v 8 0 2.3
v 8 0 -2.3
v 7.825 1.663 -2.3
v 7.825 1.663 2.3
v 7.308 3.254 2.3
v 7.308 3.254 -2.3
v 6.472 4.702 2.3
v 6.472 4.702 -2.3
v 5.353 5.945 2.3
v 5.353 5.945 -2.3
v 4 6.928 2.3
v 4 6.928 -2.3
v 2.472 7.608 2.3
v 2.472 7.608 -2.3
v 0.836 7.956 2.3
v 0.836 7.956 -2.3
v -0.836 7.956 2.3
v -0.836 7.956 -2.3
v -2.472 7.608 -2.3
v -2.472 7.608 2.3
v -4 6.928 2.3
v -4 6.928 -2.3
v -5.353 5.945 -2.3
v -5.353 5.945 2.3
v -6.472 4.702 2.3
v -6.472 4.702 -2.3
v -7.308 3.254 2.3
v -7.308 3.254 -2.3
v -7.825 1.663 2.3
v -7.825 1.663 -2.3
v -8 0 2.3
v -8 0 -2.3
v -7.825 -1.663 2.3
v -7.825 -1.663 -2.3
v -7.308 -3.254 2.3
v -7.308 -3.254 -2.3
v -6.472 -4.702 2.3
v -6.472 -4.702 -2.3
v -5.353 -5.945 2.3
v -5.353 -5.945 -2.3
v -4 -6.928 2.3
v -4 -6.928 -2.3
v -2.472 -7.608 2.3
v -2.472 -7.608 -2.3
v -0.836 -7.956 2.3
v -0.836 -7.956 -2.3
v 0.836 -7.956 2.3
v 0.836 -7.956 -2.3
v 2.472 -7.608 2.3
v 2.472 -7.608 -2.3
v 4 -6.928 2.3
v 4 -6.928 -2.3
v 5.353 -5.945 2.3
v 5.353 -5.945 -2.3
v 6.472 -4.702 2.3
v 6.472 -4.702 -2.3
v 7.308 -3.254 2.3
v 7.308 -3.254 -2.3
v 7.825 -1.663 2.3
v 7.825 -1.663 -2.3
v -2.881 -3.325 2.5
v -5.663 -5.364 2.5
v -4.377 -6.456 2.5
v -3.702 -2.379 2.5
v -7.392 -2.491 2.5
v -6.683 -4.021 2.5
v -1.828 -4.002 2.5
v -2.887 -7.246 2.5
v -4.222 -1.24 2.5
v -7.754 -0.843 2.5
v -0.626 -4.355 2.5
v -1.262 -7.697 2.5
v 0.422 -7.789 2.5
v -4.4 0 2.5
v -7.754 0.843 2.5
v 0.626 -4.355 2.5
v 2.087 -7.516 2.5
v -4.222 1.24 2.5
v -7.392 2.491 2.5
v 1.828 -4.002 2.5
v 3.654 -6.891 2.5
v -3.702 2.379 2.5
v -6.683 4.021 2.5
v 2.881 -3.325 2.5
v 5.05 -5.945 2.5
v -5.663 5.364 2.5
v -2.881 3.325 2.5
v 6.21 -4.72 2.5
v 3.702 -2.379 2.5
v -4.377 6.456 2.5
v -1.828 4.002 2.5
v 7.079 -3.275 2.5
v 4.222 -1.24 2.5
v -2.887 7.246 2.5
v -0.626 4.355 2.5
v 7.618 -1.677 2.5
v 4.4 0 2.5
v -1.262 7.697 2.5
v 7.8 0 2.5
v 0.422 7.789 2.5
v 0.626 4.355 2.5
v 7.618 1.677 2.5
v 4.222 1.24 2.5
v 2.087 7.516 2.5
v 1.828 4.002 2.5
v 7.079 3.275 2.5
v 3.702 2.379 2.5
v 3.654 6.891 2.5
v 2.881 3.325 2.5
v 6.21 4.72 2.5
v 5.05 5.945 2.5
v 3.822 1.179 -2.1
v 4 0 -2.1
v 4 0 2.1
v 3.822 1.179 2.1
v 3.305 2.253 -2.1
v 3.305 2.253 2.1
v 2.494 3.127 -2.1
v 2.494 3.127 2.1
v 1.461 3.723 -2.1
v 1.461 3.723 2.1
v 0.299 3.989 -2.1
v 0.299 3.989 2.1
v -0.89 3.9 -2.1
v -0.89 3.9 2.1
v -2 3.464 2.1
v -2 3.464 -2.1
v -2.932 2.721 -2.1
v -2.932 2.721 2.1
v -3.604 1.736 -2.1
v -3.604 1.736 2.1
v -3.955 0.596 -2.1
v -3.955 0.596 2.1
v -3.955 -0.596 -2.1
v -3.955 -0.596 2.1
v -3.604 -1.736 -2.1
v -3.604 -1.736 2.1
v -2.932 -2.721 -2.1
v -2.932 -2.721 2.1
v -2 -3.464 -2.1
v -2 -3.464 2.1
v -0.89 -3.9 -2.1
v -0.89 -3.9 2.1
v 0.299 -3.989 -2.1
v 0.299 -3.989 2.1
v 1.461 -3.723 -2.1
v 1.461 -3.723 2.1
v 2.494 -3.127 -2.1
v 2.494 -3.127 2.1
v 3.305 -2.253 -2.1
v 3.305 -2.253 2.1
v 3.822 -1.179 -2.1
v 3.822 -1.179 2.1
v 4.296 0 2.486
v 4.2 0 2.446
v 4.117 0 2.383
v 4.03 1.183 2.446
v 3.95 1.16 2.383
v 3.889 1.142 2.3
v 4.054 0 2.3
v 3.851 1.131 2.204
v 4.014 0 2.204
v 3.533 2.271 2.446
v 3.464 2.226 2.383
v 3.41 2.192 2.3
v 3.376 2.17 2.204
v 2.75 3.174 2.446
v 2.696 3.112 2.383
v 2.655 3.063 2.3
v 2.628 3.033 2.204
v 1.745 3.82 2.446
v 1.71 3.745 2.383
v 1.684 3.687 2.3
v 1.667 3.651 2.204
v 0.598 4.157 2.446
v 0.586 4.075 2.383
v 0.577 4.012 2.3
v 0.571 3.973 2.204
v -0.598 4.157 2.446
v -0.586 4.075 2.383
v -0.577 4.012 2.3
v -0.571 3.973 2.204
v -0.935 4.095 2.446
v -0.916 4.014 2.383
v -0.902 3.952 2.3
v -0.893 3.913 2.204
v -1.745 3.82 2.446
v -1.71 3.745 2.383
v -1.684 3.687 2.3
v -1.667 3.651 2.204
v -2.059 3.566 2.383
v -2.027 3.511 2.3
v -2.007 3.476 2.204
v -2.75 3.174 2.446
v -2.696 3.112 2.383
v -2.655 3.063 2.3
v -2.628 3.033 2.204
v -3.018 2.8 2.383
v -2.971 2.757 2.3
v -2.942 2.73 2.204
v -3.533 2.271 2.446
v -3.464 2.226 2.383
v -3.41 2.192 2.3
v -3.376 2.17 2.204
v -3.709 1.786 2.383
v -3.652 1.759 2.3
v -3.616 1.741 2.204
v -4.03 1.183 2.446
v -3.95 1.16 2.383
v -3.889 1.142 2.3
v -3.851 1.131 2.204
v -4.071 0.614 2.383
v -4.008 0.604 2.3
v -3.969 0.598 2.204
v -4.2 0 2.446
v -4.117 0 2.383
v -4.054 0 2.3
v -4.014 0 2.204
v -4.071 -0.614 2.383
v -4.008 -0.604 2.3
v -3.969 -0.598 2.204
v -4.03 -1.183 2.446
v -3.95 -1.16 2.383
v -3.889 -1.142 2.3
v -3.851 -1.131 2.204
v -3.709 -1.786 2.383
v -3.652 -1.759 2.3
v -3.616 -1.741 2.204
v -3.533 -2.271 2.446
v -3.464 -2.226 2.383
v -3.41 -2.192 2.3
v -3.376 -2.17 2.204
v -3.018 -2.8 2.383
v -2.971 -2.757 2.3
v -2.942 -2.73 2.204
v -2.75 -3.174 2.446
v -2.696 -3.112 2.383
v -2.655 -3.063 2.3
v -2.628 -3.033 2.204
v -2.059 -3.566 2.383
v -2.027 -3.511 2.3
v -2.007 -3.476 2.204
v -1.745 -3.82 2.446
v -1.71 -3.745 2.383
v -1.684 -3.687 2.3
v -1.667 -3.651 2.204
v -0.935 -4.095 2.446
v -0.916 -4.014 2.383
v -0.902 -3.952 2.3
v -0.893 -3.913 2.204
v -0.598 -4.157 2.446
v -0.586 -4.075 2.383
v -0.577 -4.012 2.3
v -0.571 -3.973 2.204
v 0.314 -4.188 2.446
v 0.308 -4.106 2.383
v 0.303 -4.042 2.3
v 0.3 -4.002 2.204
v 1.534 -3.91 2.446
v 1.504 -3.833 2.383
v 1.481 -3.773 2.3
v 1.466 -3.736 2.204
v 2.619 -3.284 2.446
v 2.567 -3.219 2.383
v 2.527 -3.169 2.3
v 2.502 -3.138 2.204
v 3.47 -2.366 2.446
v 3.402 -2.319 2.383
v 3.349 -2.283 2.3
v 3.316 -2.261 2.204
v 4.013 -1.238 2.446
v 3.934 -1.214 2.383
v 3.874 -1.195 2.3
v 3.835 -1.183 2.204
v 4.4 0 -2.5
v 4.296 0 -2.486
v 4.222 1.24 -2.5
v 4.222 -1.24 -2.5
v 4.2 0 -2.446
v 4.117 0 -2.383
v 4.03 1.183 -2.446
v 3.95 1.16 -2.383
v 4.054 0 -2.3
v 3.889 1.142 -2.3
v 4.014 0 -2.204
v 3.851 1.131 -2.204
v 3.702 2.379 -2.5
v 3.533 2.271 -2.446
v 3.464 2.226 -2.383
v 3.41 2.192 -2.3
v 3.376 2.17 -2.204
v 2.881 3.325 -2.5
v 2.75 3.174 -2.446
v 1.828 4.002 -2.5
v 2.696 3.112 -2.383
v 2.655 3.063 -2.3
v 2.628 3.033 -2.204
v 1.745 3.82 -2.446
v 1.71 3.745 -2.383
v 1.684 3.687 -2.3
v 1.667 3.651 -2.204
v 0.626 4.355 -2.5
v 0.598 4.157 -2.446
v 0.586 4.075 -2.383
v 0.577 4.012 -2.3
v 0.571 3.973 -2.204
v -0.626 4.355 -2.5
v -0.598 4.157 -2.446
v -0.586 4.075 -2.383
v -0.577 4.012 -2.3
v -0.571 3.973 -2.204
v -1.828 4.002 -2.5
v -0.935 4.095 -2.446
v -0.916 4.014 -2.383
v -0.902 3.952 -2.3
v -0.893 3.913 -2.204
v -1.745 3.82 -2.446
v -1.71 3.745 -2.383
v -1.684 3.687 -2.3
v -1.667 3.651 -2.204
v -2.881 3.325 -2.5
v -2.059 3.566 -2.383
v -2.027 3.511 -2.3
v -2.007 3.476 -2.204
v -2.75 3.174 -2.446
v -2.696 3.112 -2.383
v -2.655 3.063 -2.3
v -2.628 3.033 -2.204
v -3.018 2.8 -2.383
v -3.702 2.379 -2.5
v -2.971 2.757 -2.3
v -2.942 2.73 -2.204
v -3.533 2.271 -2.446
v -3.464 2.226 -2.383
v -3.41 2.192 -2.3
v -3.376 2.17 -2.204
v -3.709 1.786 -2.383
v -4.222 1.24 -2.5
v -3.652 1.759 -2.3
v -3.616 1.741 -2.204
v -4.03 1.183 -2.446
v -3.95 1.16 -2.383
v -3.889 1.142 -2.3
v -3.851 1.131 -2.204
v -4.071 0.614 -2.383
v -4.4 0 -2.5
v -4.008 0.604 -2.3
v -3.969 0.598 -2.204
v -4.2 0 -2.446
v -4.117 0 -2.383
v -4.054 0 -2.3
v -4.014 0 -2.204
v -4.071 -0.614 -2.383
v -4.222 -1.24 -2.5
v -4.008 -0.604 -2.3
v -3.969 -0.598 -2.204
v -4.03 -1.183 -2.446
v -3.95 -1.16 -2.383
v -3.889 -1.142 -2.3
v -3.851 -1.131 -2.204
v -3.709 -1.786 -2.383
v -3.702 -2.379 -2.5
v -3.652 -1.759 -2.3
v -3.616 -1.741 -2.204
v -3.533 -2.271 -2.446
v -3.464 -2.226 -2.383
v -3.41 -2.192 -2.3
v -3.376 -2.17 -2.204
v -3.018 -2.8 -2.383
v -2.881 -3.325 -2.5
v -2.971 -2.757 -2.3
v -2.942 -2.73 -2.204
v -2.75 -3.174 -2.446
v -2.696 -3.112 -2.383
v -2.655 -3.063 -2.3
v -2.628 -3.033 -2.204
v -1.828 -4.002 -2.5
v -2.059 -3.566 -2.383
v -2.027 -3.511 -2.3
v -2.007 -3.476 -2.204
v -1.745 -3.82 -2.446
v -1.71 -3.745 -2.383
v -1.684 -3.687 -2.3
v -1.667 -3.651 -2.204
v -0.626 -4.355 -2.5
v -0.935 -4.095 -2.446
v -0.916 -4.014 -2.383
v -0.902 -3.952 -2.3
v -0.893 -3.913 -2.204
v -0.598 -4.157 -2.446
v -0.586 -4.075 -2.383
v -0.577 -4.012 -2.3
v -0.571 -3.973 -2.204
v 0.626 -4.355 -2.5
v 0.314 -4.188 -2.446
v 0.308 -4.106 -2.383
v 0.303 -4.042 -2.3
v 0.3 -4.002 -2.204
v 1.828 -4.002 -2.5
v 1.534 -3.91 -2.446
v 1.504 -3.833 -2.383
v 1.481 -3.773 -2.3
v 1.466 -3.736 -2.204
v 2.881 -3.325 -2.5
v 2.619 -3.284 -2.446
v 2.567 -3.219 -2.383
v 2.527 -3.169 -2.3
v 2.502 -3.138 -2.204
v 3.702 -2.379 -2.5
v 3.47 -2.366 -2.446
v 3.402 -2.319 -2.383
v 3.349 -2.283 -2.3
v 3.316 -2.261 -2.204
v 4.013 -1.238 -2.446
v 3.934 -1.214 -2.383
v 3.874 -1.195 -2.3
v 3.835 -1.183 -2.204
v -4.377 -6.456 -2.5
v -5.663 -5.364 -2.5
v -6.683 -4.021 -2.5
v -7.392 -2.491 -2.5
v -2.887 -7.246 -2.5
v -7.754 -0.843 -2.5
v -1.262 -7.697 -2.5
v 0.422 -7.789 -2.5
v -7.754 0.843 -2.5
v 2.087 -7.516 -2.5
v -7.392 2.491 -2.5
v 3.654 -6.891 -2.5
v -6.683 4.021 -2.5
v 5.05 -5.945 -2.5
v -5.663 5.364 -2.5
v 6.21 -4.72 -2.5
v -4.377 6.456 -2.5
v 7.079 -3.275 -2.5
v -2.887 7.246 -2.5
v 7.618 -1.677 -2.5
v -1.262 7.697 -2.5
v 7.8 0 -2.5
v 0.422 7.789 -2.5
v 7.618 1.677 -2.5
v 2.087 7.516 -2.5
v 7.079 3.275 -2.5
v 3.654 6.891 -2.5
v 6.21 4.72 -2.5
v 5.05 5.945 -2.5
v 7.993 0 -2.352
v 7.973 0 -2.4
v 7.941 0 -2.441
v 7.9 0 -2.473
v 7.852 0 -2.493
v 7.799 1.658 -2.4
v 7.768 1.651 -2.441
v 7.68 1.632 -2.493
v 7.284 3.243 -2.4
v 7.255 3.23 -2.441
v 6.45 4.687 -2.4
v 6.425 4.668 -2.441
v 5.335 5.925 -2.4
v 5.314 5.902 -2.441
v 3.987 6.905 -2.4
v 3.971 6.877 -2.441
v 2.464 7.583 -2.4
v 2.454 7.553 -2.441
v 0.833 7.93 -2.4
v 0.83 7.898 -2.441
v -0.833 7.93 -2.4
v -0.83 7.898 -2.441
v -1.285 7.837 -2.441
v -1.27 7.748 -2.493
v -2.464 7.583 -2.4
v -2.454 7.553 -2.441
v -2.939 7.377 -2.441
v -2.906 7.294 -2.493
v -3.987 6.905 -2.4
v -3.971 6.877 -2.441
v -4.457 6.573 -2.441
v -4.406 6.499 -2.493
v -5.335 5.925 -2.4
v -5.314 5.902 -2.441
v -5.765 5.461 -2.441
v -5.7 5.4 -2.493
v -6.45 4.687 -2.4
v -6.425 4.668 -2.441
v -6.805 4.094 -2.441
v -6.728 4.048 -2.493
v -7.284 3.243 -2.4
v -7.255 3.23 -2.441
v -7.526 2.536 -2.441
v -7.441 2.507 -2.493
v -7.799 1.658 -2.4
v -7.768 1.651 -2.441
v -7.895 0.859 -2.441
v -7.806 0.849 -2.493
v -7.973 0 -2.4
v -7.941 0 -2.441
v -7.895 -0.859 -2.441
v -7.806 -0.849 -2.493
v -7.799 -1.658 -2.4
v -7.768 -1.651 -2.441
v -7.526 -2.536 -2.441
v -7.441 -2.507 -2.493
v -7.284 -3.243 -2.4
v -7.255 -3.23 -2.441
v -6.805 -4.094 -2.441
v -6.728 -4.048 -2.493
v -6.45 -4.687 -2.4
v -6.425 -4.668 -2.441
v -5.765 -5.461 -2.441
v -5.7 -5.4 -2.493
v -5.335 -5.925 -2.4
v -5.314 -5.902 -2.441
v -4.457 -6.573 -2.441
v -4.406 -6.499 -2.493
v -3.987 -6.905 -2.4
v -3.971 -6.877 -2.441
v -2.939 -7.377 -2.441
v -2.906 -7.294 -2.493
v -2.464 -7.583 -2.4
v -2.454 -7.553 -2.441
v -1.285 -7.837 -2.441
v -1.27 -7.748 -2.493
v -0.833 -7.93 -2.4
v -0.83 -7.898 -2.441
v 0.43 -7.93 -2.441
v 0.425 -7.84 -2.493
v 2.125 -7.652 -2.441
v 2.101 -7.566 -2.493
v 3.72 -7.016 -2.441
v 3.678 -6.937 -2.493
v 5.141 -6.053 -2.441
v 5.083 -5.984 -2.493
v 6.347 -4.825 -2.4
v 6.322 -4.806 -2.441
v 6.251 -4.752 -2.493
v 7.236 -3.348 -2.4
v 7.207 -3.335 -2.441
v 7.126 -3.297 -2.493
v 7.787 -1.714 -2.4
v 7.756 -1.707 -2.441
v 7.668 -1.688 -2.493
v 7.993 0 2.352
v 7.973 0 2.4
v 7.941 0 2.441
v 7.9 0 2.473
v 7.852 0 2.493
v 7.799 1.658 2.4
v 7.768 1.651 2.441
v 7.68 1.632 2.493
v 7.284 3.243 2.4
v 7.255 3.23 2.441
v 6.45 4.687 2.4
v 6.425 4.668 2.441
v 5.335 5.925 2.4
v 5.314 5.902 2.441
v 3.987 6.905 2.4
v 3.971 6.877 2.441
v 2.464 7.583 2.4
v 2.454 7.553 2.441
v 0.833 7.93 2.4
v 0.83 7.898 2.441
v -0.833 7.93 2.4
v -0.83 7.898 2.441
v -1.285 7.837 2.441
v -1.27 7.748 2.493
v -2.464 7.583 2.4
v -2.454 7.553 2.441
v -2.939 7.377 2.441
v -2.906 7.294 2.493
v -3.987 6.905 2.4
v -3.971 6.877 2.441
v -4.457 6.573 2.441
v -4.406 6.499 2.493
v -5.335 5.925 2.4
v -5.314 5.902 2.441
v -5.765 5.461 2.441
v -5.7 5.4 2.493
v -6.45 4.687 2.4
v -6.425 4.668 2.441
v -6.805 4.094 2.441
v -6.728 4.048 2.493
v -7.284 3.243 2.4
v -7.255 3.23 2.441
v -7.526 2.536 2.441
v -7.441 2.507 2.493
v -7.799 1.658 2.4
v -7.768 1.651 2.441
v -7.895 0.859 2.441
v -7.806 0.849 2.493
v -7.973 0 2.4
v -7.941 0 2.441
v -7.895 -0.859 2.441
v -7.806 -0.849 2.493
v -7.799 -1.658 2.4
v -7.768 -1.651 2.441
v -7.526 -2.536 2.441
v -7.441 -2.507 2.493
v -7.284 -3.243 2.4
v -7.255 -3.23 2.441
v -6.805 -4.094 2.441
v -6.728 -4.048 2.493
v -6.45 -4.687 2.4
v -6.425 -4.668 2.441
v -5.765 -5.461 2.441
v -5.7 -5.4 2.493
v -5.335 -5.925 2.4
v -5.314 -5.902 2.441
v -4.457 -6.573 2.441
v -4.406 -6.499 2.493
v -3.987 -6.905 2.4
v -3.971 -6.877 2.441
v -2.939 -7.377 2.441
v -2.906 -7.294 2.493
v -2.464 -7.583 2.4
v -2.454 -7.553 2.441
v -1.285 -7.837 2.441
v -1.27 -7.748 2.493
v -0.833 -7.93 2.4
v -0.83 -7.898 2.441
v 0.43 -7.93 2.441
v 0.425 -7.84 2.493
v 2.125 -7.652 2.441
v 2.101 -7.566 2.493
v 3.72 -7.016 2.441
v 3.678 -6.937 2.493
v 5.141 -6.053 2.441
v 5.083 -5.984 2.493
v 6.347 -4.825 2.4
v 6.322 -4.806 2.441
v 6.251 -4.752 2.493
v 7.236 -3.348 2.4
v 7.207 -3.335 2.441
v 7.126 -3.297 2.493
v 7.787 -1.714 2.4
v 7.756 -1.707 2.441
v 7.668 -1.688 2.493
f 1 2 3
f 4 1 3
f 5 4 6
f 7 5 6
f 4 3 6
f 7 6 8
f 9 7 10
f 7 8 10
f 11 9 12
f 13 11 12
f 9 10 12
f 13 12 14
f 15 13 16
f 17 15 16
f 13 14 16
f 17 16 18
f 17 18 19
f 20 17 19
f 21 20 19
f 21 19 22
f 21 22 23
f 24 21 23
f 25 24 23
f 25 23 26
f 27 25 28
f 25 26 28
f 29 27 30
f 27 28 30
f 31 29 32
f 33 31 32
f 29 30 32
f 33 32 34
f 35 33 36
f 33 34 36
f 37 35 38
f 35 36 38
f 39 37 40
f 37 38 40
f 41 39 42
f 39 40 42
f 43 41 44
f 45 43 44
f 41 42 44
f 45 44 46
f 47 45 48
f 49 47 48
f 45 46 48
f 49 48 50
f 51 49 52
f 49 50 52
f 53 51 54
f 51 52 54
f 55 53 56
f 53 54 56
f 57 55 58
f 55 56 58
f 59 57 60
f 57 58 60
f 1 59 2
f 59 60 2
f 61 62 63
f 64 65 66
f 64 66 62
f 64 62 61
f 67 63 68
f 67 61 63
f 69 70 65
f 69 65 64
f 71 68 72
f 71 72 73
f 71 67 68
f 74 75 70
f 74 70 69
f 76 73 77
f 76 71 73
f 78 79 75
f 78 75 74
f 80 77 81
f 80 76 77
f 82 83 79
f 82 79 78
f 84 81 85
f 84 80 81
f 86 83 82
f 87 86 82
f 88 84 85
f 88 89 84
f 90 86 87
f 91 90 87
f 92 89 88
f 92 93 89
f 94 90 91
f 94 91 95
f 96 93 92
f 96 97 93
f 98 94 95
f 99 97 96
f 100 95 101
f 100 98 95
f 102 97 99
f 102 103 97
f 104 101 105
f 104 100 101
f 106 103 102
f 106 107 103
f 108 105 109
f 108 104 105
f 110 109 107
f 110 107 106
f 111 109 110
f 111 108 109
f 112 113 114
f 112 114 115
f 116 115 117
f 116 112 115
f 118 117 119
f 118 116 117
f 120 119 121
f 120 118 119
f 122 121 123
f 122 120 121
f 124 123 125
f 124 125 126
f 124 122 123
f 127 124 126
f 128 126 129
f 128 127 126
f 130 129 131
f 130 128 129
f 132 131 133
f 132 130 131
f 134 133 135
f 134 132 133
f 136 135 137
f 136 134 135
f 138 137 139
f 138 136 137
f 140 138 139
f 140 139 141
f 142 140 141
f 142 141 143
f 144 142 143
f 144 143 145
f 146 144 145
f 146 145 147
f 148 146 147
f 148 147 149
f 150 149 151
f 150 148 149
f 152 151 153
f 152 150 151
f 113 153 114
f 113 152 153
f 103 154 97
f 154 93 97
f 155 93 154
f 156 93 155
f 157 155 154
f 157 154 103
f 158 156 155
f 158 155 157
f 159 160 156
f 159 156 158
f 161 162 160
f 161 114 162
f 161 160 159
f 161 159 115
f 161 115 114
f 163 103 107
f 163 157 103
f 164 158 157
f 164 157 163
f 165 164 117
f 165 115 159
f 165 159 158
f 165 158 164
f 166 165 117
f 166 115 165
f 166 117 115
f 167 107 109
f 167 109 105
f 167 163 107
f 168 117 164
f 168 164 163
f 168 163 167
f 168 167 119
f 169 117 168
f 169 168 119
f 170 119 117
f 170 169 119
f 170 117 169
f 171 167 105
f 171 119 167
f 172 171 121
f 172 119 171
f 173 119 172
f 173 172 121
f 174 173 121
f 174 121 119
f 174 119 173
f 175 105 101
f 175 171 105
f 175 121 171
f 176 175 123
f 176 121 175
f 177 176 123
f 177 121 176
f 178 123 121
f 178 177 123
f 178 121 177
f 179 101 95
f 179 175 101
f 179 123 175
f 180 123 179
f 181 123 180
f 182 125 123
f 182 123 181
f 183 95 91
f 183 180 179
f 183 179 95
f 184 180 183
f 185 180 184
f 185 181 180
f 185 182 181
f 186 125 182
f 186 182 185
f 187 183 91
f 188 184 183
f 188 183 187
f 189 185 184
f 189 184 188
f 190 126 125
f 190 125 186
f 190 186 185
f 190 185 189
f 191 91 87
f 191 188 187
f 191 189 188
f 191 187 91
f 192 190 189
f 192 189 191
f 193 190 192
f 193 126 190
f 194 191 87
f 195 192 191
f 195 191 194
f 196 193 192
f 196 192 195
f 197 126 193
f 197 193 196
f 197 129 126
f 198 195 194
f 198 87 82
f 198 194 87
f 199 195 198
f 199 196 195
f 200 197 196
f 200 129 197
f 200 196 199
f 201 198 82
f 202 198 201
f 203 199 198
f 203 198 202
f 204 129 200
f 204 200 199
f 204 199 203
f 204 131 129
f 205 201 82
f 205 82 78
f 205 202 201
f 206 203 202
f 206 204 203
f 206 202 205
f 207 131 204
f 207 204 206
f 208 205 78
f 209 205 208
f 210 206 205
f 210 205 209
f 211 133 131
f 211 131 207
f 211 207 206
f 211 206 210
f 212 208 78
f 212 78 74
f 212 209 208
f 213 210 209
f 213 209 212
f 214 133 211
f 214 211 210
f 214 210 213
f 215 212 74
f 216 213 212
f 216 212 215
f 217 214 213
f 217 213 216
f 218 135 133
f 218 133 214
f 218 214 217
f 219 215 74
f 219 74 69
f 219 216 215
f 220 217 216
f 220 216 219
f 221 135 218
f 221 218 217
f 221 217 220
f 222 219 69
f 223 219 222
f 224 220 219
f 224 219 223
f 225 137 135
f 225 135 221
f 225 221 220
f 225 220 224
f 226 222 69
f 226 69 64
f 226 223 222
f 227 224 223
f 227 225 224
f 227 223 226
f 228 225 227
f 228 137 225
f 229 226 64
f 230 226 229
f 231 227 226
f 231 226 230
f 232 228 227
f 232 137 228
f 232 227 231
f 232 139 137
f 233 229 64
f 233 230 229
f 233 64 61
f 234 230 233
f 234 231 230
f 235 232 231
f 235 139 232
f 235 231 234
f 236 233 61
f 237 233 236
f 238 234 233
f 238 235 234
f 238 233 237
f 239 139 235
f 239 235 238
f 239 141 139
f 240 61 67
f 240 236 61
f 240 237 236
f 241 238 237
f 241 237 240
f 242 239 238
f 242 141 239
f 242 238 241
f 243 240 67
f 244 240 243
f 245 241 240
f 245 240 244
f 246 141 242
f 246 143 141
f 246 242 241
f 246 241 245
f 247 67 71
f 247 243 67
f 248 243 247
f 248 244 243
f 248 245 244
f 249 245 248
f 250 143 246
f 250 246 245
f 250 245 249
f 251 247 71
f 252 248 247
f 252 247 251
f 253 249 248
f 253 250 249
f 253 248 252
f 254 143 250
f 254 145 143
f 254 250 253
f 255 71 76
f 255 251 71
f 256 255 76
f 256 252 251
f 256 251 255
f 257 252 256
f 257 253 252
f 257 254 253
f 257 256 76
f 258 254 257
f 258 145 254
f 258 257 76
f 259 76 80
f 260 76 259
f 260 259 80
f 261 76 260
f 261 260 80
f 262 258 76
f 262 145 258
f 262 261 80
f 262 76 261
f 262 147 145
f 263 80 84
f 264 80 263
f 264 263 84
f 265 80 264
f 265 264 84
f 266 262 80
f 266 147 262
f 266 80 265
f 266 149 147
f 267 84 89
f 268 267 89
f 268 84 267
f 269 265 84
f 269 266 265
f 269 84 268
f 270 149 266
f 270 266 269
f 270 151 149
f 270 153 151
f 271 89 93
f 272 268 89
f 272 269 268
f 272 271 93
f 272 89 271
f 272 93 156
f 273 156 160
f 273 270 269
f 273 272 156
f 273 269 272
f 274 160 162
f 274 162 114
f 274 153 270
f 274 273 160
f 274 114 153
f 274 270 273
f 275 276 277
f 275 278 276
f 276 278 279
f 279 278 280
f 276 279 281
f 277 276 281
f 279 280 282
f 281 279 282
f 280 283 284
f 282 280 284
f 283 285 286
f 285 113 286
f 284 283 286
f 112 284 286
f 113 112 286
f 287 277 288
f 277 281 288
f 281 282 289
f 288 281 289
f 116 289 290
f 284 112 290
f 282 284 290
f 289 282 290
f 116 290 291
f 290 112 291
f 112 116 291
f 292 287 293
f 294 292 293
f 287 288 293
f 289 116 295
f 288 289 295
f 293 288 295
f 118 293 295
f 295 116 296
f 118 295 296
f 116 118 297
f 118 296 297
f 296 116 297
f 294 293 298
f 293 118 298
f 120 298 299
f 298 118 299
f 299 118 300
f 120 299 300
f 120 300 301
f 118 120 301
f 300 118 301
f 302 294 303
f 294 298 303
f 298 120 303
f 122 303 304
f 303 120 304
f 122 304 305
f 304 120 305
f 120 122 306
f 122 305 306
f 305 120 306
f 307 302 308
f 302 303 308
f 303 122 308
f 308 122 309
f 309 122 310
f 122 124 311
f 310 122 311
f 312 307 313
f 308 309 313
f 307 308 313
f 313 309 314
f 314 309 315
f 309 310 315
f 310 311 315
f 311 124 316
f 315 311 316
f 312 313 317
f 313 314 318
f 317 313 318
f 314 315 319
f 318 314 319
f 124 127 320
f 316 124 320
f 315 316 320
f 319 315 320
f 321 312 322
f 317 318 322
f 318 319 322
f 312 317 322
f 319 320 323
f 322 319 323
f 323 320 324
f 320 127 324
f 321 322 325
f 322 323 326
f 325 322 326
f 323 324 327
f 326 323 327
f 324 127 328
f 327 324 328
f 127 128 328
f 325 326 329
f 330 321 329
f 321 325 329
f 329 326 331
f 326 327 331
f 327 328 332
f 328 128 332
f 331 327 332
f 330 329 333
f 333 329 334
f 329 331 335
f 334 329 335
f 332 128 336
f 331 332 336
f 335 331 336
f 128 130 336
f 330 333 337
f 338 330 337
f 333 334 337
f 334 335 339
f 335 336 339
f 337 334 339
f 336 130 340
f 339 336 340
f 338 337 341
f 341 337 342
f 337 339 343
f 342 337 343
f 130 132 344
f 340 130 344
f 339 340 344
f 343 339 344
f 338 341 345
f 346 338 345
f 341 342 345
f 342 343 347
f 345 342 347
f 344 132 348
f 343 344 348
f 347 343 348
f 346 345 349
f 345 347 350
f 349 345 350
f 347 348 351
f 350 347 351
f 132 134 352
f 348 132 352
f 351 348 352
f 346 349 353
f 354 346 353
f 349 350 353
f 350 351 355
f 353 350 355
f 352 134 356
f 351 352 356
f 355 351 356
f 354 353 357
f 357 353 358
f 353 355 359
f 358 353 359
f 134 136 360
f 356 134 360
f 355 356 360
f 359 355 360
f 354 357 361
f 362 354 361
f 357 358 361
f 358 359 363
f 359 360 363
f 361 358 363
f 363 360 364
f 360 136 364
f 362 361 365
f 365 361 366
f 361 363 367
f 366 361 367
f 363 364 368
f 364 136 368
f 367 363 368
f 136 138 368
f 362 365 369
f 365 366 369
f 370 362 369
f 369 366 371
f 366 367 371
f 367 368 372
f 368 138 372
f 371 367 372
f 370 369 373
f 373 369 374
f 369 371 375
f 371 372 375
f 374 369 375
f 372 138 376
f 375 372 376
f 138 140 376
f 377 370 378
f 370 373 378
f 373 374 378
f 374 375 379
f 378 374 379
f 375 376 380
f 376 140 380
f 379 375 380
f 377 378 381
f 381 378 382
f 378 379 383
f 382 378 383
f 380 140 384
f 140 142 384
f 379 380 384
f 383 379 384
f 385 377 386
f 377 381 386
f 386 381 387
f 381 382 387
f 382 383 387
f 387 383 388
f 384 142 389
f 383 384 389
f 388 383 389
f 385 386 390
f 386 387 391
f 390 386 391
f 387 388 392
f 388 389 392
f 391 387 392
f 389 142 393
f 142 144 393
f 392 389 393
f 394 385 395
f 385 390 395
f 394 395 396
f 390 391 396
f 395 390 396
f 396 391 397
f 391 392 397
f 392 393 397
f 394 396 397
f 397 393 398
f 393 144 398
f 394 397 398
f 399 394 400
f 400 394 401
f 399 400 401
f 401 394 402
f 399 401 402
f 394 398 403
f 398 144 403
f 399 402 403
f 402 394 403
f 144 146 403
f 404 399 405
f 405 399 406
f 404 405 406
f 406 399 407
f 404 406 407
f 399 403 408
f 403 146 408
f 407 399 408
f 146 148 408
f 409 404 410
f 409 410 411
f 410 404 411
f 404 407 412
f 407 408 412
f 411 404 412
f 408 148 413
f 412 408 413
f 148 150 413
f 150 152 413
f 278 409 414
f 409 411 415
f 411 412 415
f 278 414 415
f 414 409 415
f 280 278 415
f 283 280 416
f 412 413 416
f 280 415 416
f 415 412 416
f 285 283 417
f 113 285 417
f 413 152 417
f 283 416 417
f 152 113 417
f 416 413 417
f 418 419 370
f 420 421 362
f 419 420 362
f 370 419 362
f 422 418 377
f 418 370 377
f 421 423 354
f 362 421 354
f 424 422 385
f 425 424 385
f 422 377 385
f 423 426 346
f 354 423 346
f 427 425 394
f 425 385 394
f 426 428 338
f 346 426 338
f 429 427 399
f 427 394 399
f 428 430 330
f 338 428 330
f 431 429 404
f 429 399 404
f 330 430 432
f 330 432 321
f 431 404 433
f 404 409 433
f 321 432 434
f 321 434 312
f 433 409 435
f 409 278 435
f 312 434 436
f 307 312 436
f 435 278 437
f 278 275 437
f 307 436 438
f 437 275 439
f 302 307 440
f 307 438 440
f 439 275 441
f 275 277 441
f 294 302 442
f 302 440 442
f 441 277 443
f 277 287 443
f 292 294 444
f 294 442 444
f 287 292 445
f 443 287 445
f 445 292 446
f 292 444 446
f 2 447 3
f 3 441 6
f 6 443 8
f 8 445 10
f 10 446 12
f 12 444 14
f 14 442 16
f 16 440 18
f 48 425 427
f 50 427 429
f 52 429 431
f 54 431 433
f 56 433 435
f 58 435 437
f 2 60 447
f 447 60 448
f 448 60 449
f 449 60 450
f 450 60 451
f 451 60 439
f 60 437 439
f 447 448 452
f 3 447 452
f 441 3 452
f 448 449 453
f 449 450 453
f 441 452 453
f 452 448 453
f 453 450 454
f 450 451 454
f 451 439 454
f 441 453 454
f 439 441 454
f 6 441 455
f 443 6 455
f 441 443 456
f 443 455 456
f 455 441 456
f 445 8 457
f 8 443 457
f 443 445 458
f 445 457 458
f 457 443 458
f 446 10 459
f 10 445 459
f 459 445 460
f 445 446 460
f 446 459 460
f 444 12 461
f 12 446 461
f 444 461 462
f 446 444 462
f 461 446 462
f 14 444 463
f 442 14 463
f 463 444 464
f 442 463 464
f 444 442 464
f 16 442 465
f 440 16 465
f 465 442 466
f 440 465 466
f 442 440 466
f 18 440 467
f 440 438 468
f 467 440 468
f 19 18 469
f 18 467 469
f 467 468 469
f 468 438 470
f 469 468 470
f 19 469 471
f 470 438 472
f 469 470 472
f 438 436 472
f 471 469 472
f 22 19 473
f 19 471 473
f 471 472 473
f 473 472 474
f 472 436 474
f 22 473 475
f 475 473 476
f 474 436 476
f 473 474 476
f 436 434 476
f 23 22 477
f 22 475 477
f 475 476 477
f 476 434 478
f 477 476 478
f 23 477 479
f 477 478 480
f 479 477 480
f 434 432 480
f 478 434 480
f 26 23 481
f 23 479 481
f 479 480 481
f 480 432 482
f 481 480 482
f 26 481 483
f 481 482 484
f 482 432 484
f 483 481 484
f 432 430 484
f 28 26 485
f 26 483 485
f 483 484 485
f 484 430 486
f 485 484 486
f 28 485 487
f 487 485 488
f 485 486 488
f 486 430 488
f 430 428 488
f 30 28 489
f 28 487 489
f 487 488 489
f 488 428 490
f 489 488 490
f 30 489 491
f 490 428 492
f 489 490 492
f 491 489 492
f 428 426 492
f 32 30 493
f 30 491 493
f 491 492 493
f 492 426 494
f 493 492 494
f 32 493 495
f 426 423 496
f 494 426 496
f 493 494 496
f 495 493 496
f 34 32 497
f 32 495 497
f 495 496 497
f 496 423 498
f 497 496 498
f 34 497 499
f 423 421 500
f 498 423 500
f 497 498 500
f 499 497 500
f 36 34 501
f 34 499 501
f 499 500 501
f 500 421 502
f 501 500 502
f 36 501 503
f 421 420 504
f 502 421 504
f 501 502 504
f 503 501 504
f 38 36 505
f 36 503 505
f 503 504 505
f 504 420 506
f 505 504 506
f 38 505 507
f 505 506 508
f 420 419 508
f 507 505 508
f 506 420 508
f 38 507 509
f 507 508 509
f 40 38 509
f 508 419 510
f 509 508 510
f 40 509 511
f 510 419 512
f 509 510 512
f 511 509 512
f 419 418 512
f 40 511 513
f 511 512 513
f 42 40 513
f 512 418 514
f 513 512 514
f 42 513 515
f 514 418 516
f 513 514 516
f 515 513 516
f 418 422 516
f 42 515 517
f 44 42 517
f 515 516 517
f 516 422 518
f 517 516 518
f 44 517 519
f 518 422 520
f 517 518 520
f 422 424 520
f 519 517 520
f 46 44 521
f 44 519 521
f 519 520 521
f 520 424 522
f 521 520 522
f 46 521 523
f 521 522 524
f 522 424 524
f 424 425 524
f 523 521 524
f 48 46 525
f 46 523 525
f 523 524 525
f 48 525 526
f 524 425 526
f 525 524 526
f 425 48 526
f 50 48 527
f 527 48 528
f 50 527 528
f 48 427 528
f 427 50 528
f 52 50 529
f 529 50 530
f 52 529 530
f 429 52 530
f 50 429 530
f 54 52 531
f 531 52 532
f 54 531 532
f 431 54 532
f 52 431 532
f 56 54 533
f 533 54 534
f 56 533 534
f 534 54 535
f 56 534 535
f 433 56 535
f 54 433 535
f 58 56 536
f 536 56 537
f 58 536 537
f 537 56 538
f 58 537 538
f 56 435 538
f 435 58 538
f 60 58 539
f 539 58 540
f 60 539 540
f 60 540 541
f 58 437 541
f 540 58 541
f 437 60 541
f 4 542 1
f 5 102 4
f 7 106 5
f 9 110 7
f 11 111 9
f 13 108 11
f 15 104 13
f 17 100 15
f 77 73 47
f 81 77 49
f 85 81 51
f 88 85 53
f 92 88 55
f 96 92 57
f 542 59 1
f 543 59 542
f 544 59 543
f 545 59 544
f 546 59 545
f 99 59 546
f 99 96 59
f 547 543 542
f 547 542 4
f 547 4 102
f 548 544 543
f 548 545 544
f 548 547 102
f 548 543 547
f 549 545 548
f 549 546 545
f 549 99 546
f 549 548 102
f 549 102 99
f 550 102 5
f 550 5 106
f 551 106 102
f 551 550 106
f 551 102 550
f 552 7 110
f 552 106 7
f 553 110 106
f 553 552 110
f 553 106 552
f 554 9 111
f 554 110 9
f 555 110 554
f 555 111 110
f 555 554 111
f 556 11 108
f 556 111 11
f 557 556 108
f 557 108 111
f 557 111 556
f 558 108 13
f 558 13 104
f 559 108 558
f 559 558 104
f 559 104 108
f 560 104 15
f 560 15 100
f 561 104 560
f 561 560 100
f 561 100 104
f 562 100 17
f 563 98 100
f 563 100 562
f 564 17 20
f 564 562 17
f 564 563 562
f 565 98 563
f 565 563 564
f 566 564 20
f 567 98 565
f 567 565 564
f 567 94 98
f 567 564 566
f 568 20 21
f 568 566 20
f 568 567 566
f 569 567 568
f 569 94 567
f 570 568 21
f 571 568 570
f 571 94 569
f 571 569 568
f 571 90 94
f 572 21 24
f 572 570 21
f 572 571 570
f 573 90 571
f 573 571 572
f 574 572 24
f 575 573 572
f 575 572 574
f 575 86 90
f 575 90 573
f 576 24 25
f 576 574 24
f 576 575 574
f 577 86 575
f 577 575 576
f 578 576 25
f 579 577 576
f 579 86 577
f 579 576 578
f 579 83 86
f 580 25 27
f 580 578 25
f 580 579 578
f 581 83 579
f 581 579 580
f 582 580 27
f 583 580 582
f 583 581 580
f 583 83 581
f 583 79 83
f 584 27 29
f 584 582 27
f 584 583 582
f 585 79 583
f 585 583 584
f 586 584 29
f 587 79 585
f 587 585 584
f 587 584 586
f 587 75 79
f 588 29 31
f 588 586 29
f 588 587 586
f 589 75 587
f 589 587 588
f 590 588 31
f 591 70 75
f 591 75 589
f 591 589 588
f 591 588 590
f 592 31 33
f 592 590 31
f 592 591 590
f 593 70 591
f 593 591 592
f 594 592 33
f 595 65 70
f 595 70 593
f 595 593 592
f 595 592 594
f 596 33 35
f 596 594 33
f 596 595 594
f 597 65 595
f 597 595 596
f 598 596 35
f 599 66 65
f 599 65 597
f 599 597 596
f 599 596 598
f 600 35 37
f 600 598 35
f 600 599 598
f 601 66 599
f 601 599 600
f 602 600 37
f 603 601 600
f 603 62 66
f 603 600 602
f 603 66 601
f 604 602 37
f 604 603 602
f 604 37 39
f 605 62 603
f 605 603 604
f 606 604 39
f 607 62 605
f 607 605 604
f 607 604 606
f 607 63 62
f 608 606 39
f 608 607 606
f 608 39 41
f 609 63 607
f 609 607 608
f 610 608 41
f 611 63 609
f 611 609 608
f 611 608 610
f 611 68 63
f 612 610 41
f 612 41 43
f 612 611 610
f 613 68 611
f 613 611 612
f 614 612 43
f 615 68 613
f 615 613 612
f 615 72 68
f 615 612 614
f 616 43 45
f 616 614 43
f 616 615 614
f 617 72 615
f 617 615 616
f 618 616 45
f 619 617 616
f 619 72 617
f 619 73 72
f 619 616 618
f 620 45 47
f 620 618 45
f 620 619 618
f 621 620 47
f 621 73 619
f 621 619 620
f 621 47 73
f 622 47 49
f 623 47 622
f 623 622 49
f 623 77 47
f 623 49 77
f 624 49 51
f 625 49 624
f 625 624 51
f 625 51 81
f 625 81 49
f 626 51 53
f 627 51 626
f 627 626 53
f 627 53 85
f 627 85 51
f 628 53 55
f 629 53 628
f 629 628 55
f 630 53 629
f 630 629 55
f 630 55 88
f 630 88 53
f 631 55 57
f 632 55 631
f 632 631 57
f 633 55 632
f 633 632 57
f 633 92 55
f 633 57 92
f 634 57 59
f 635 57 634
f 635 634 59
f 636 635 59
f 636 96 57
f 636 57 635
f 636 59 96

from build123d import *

# Parameters (mm, degrees)
BEARING_BOSS_EXTRUDE1_DEPTH      = 2.5
BEARING_BOSS_EXTRUDE1_DEPTH_BACK = 2.5
SKETCH1_R                        = 8
SKETCH1_R_2                      = 4
FILLET6_R                        = 0.2
FILLET7_R                        = 0.4


with BuildPart() as part:
    # Sketch1 → Bearing Boss-Extrude1 (new, two sides: drawn at the far end of the back side and taken through both)
    with BuildSketch(Plane.XY.offset(-BEARING_BOSS_EXTRUDE1_DEPTH_BACK)):
        Circle(SKETCH1_R)
        Circle(SKETCH1_R_2, mode=Mode.SUBTRACT)
    extrude(amount=BEARING_BOSS_EXTRUDE1_DEPTH + BEARING_BOSS_EXTRUDE1_DEPTH_BACK)

    # Fillet6
    fillet6_edges = [part.edges().sort_by_distance(p)[0] for p in [
        (-8, 0, -2.5),
        (-8, 0, 2.5),
    ]]
    fillet(fillet6_edges, radius=FILLET6_R)

    # Fillet7
    fillet7_edges = [part.edges().sort_by_distance(p)[0] for p in [
        (-4, 0, -2.5),
        (-4, 0, 2.5),
    ]]
    fillet(fillet7_edges, radius=FILLET7_R)


solid = part.part
